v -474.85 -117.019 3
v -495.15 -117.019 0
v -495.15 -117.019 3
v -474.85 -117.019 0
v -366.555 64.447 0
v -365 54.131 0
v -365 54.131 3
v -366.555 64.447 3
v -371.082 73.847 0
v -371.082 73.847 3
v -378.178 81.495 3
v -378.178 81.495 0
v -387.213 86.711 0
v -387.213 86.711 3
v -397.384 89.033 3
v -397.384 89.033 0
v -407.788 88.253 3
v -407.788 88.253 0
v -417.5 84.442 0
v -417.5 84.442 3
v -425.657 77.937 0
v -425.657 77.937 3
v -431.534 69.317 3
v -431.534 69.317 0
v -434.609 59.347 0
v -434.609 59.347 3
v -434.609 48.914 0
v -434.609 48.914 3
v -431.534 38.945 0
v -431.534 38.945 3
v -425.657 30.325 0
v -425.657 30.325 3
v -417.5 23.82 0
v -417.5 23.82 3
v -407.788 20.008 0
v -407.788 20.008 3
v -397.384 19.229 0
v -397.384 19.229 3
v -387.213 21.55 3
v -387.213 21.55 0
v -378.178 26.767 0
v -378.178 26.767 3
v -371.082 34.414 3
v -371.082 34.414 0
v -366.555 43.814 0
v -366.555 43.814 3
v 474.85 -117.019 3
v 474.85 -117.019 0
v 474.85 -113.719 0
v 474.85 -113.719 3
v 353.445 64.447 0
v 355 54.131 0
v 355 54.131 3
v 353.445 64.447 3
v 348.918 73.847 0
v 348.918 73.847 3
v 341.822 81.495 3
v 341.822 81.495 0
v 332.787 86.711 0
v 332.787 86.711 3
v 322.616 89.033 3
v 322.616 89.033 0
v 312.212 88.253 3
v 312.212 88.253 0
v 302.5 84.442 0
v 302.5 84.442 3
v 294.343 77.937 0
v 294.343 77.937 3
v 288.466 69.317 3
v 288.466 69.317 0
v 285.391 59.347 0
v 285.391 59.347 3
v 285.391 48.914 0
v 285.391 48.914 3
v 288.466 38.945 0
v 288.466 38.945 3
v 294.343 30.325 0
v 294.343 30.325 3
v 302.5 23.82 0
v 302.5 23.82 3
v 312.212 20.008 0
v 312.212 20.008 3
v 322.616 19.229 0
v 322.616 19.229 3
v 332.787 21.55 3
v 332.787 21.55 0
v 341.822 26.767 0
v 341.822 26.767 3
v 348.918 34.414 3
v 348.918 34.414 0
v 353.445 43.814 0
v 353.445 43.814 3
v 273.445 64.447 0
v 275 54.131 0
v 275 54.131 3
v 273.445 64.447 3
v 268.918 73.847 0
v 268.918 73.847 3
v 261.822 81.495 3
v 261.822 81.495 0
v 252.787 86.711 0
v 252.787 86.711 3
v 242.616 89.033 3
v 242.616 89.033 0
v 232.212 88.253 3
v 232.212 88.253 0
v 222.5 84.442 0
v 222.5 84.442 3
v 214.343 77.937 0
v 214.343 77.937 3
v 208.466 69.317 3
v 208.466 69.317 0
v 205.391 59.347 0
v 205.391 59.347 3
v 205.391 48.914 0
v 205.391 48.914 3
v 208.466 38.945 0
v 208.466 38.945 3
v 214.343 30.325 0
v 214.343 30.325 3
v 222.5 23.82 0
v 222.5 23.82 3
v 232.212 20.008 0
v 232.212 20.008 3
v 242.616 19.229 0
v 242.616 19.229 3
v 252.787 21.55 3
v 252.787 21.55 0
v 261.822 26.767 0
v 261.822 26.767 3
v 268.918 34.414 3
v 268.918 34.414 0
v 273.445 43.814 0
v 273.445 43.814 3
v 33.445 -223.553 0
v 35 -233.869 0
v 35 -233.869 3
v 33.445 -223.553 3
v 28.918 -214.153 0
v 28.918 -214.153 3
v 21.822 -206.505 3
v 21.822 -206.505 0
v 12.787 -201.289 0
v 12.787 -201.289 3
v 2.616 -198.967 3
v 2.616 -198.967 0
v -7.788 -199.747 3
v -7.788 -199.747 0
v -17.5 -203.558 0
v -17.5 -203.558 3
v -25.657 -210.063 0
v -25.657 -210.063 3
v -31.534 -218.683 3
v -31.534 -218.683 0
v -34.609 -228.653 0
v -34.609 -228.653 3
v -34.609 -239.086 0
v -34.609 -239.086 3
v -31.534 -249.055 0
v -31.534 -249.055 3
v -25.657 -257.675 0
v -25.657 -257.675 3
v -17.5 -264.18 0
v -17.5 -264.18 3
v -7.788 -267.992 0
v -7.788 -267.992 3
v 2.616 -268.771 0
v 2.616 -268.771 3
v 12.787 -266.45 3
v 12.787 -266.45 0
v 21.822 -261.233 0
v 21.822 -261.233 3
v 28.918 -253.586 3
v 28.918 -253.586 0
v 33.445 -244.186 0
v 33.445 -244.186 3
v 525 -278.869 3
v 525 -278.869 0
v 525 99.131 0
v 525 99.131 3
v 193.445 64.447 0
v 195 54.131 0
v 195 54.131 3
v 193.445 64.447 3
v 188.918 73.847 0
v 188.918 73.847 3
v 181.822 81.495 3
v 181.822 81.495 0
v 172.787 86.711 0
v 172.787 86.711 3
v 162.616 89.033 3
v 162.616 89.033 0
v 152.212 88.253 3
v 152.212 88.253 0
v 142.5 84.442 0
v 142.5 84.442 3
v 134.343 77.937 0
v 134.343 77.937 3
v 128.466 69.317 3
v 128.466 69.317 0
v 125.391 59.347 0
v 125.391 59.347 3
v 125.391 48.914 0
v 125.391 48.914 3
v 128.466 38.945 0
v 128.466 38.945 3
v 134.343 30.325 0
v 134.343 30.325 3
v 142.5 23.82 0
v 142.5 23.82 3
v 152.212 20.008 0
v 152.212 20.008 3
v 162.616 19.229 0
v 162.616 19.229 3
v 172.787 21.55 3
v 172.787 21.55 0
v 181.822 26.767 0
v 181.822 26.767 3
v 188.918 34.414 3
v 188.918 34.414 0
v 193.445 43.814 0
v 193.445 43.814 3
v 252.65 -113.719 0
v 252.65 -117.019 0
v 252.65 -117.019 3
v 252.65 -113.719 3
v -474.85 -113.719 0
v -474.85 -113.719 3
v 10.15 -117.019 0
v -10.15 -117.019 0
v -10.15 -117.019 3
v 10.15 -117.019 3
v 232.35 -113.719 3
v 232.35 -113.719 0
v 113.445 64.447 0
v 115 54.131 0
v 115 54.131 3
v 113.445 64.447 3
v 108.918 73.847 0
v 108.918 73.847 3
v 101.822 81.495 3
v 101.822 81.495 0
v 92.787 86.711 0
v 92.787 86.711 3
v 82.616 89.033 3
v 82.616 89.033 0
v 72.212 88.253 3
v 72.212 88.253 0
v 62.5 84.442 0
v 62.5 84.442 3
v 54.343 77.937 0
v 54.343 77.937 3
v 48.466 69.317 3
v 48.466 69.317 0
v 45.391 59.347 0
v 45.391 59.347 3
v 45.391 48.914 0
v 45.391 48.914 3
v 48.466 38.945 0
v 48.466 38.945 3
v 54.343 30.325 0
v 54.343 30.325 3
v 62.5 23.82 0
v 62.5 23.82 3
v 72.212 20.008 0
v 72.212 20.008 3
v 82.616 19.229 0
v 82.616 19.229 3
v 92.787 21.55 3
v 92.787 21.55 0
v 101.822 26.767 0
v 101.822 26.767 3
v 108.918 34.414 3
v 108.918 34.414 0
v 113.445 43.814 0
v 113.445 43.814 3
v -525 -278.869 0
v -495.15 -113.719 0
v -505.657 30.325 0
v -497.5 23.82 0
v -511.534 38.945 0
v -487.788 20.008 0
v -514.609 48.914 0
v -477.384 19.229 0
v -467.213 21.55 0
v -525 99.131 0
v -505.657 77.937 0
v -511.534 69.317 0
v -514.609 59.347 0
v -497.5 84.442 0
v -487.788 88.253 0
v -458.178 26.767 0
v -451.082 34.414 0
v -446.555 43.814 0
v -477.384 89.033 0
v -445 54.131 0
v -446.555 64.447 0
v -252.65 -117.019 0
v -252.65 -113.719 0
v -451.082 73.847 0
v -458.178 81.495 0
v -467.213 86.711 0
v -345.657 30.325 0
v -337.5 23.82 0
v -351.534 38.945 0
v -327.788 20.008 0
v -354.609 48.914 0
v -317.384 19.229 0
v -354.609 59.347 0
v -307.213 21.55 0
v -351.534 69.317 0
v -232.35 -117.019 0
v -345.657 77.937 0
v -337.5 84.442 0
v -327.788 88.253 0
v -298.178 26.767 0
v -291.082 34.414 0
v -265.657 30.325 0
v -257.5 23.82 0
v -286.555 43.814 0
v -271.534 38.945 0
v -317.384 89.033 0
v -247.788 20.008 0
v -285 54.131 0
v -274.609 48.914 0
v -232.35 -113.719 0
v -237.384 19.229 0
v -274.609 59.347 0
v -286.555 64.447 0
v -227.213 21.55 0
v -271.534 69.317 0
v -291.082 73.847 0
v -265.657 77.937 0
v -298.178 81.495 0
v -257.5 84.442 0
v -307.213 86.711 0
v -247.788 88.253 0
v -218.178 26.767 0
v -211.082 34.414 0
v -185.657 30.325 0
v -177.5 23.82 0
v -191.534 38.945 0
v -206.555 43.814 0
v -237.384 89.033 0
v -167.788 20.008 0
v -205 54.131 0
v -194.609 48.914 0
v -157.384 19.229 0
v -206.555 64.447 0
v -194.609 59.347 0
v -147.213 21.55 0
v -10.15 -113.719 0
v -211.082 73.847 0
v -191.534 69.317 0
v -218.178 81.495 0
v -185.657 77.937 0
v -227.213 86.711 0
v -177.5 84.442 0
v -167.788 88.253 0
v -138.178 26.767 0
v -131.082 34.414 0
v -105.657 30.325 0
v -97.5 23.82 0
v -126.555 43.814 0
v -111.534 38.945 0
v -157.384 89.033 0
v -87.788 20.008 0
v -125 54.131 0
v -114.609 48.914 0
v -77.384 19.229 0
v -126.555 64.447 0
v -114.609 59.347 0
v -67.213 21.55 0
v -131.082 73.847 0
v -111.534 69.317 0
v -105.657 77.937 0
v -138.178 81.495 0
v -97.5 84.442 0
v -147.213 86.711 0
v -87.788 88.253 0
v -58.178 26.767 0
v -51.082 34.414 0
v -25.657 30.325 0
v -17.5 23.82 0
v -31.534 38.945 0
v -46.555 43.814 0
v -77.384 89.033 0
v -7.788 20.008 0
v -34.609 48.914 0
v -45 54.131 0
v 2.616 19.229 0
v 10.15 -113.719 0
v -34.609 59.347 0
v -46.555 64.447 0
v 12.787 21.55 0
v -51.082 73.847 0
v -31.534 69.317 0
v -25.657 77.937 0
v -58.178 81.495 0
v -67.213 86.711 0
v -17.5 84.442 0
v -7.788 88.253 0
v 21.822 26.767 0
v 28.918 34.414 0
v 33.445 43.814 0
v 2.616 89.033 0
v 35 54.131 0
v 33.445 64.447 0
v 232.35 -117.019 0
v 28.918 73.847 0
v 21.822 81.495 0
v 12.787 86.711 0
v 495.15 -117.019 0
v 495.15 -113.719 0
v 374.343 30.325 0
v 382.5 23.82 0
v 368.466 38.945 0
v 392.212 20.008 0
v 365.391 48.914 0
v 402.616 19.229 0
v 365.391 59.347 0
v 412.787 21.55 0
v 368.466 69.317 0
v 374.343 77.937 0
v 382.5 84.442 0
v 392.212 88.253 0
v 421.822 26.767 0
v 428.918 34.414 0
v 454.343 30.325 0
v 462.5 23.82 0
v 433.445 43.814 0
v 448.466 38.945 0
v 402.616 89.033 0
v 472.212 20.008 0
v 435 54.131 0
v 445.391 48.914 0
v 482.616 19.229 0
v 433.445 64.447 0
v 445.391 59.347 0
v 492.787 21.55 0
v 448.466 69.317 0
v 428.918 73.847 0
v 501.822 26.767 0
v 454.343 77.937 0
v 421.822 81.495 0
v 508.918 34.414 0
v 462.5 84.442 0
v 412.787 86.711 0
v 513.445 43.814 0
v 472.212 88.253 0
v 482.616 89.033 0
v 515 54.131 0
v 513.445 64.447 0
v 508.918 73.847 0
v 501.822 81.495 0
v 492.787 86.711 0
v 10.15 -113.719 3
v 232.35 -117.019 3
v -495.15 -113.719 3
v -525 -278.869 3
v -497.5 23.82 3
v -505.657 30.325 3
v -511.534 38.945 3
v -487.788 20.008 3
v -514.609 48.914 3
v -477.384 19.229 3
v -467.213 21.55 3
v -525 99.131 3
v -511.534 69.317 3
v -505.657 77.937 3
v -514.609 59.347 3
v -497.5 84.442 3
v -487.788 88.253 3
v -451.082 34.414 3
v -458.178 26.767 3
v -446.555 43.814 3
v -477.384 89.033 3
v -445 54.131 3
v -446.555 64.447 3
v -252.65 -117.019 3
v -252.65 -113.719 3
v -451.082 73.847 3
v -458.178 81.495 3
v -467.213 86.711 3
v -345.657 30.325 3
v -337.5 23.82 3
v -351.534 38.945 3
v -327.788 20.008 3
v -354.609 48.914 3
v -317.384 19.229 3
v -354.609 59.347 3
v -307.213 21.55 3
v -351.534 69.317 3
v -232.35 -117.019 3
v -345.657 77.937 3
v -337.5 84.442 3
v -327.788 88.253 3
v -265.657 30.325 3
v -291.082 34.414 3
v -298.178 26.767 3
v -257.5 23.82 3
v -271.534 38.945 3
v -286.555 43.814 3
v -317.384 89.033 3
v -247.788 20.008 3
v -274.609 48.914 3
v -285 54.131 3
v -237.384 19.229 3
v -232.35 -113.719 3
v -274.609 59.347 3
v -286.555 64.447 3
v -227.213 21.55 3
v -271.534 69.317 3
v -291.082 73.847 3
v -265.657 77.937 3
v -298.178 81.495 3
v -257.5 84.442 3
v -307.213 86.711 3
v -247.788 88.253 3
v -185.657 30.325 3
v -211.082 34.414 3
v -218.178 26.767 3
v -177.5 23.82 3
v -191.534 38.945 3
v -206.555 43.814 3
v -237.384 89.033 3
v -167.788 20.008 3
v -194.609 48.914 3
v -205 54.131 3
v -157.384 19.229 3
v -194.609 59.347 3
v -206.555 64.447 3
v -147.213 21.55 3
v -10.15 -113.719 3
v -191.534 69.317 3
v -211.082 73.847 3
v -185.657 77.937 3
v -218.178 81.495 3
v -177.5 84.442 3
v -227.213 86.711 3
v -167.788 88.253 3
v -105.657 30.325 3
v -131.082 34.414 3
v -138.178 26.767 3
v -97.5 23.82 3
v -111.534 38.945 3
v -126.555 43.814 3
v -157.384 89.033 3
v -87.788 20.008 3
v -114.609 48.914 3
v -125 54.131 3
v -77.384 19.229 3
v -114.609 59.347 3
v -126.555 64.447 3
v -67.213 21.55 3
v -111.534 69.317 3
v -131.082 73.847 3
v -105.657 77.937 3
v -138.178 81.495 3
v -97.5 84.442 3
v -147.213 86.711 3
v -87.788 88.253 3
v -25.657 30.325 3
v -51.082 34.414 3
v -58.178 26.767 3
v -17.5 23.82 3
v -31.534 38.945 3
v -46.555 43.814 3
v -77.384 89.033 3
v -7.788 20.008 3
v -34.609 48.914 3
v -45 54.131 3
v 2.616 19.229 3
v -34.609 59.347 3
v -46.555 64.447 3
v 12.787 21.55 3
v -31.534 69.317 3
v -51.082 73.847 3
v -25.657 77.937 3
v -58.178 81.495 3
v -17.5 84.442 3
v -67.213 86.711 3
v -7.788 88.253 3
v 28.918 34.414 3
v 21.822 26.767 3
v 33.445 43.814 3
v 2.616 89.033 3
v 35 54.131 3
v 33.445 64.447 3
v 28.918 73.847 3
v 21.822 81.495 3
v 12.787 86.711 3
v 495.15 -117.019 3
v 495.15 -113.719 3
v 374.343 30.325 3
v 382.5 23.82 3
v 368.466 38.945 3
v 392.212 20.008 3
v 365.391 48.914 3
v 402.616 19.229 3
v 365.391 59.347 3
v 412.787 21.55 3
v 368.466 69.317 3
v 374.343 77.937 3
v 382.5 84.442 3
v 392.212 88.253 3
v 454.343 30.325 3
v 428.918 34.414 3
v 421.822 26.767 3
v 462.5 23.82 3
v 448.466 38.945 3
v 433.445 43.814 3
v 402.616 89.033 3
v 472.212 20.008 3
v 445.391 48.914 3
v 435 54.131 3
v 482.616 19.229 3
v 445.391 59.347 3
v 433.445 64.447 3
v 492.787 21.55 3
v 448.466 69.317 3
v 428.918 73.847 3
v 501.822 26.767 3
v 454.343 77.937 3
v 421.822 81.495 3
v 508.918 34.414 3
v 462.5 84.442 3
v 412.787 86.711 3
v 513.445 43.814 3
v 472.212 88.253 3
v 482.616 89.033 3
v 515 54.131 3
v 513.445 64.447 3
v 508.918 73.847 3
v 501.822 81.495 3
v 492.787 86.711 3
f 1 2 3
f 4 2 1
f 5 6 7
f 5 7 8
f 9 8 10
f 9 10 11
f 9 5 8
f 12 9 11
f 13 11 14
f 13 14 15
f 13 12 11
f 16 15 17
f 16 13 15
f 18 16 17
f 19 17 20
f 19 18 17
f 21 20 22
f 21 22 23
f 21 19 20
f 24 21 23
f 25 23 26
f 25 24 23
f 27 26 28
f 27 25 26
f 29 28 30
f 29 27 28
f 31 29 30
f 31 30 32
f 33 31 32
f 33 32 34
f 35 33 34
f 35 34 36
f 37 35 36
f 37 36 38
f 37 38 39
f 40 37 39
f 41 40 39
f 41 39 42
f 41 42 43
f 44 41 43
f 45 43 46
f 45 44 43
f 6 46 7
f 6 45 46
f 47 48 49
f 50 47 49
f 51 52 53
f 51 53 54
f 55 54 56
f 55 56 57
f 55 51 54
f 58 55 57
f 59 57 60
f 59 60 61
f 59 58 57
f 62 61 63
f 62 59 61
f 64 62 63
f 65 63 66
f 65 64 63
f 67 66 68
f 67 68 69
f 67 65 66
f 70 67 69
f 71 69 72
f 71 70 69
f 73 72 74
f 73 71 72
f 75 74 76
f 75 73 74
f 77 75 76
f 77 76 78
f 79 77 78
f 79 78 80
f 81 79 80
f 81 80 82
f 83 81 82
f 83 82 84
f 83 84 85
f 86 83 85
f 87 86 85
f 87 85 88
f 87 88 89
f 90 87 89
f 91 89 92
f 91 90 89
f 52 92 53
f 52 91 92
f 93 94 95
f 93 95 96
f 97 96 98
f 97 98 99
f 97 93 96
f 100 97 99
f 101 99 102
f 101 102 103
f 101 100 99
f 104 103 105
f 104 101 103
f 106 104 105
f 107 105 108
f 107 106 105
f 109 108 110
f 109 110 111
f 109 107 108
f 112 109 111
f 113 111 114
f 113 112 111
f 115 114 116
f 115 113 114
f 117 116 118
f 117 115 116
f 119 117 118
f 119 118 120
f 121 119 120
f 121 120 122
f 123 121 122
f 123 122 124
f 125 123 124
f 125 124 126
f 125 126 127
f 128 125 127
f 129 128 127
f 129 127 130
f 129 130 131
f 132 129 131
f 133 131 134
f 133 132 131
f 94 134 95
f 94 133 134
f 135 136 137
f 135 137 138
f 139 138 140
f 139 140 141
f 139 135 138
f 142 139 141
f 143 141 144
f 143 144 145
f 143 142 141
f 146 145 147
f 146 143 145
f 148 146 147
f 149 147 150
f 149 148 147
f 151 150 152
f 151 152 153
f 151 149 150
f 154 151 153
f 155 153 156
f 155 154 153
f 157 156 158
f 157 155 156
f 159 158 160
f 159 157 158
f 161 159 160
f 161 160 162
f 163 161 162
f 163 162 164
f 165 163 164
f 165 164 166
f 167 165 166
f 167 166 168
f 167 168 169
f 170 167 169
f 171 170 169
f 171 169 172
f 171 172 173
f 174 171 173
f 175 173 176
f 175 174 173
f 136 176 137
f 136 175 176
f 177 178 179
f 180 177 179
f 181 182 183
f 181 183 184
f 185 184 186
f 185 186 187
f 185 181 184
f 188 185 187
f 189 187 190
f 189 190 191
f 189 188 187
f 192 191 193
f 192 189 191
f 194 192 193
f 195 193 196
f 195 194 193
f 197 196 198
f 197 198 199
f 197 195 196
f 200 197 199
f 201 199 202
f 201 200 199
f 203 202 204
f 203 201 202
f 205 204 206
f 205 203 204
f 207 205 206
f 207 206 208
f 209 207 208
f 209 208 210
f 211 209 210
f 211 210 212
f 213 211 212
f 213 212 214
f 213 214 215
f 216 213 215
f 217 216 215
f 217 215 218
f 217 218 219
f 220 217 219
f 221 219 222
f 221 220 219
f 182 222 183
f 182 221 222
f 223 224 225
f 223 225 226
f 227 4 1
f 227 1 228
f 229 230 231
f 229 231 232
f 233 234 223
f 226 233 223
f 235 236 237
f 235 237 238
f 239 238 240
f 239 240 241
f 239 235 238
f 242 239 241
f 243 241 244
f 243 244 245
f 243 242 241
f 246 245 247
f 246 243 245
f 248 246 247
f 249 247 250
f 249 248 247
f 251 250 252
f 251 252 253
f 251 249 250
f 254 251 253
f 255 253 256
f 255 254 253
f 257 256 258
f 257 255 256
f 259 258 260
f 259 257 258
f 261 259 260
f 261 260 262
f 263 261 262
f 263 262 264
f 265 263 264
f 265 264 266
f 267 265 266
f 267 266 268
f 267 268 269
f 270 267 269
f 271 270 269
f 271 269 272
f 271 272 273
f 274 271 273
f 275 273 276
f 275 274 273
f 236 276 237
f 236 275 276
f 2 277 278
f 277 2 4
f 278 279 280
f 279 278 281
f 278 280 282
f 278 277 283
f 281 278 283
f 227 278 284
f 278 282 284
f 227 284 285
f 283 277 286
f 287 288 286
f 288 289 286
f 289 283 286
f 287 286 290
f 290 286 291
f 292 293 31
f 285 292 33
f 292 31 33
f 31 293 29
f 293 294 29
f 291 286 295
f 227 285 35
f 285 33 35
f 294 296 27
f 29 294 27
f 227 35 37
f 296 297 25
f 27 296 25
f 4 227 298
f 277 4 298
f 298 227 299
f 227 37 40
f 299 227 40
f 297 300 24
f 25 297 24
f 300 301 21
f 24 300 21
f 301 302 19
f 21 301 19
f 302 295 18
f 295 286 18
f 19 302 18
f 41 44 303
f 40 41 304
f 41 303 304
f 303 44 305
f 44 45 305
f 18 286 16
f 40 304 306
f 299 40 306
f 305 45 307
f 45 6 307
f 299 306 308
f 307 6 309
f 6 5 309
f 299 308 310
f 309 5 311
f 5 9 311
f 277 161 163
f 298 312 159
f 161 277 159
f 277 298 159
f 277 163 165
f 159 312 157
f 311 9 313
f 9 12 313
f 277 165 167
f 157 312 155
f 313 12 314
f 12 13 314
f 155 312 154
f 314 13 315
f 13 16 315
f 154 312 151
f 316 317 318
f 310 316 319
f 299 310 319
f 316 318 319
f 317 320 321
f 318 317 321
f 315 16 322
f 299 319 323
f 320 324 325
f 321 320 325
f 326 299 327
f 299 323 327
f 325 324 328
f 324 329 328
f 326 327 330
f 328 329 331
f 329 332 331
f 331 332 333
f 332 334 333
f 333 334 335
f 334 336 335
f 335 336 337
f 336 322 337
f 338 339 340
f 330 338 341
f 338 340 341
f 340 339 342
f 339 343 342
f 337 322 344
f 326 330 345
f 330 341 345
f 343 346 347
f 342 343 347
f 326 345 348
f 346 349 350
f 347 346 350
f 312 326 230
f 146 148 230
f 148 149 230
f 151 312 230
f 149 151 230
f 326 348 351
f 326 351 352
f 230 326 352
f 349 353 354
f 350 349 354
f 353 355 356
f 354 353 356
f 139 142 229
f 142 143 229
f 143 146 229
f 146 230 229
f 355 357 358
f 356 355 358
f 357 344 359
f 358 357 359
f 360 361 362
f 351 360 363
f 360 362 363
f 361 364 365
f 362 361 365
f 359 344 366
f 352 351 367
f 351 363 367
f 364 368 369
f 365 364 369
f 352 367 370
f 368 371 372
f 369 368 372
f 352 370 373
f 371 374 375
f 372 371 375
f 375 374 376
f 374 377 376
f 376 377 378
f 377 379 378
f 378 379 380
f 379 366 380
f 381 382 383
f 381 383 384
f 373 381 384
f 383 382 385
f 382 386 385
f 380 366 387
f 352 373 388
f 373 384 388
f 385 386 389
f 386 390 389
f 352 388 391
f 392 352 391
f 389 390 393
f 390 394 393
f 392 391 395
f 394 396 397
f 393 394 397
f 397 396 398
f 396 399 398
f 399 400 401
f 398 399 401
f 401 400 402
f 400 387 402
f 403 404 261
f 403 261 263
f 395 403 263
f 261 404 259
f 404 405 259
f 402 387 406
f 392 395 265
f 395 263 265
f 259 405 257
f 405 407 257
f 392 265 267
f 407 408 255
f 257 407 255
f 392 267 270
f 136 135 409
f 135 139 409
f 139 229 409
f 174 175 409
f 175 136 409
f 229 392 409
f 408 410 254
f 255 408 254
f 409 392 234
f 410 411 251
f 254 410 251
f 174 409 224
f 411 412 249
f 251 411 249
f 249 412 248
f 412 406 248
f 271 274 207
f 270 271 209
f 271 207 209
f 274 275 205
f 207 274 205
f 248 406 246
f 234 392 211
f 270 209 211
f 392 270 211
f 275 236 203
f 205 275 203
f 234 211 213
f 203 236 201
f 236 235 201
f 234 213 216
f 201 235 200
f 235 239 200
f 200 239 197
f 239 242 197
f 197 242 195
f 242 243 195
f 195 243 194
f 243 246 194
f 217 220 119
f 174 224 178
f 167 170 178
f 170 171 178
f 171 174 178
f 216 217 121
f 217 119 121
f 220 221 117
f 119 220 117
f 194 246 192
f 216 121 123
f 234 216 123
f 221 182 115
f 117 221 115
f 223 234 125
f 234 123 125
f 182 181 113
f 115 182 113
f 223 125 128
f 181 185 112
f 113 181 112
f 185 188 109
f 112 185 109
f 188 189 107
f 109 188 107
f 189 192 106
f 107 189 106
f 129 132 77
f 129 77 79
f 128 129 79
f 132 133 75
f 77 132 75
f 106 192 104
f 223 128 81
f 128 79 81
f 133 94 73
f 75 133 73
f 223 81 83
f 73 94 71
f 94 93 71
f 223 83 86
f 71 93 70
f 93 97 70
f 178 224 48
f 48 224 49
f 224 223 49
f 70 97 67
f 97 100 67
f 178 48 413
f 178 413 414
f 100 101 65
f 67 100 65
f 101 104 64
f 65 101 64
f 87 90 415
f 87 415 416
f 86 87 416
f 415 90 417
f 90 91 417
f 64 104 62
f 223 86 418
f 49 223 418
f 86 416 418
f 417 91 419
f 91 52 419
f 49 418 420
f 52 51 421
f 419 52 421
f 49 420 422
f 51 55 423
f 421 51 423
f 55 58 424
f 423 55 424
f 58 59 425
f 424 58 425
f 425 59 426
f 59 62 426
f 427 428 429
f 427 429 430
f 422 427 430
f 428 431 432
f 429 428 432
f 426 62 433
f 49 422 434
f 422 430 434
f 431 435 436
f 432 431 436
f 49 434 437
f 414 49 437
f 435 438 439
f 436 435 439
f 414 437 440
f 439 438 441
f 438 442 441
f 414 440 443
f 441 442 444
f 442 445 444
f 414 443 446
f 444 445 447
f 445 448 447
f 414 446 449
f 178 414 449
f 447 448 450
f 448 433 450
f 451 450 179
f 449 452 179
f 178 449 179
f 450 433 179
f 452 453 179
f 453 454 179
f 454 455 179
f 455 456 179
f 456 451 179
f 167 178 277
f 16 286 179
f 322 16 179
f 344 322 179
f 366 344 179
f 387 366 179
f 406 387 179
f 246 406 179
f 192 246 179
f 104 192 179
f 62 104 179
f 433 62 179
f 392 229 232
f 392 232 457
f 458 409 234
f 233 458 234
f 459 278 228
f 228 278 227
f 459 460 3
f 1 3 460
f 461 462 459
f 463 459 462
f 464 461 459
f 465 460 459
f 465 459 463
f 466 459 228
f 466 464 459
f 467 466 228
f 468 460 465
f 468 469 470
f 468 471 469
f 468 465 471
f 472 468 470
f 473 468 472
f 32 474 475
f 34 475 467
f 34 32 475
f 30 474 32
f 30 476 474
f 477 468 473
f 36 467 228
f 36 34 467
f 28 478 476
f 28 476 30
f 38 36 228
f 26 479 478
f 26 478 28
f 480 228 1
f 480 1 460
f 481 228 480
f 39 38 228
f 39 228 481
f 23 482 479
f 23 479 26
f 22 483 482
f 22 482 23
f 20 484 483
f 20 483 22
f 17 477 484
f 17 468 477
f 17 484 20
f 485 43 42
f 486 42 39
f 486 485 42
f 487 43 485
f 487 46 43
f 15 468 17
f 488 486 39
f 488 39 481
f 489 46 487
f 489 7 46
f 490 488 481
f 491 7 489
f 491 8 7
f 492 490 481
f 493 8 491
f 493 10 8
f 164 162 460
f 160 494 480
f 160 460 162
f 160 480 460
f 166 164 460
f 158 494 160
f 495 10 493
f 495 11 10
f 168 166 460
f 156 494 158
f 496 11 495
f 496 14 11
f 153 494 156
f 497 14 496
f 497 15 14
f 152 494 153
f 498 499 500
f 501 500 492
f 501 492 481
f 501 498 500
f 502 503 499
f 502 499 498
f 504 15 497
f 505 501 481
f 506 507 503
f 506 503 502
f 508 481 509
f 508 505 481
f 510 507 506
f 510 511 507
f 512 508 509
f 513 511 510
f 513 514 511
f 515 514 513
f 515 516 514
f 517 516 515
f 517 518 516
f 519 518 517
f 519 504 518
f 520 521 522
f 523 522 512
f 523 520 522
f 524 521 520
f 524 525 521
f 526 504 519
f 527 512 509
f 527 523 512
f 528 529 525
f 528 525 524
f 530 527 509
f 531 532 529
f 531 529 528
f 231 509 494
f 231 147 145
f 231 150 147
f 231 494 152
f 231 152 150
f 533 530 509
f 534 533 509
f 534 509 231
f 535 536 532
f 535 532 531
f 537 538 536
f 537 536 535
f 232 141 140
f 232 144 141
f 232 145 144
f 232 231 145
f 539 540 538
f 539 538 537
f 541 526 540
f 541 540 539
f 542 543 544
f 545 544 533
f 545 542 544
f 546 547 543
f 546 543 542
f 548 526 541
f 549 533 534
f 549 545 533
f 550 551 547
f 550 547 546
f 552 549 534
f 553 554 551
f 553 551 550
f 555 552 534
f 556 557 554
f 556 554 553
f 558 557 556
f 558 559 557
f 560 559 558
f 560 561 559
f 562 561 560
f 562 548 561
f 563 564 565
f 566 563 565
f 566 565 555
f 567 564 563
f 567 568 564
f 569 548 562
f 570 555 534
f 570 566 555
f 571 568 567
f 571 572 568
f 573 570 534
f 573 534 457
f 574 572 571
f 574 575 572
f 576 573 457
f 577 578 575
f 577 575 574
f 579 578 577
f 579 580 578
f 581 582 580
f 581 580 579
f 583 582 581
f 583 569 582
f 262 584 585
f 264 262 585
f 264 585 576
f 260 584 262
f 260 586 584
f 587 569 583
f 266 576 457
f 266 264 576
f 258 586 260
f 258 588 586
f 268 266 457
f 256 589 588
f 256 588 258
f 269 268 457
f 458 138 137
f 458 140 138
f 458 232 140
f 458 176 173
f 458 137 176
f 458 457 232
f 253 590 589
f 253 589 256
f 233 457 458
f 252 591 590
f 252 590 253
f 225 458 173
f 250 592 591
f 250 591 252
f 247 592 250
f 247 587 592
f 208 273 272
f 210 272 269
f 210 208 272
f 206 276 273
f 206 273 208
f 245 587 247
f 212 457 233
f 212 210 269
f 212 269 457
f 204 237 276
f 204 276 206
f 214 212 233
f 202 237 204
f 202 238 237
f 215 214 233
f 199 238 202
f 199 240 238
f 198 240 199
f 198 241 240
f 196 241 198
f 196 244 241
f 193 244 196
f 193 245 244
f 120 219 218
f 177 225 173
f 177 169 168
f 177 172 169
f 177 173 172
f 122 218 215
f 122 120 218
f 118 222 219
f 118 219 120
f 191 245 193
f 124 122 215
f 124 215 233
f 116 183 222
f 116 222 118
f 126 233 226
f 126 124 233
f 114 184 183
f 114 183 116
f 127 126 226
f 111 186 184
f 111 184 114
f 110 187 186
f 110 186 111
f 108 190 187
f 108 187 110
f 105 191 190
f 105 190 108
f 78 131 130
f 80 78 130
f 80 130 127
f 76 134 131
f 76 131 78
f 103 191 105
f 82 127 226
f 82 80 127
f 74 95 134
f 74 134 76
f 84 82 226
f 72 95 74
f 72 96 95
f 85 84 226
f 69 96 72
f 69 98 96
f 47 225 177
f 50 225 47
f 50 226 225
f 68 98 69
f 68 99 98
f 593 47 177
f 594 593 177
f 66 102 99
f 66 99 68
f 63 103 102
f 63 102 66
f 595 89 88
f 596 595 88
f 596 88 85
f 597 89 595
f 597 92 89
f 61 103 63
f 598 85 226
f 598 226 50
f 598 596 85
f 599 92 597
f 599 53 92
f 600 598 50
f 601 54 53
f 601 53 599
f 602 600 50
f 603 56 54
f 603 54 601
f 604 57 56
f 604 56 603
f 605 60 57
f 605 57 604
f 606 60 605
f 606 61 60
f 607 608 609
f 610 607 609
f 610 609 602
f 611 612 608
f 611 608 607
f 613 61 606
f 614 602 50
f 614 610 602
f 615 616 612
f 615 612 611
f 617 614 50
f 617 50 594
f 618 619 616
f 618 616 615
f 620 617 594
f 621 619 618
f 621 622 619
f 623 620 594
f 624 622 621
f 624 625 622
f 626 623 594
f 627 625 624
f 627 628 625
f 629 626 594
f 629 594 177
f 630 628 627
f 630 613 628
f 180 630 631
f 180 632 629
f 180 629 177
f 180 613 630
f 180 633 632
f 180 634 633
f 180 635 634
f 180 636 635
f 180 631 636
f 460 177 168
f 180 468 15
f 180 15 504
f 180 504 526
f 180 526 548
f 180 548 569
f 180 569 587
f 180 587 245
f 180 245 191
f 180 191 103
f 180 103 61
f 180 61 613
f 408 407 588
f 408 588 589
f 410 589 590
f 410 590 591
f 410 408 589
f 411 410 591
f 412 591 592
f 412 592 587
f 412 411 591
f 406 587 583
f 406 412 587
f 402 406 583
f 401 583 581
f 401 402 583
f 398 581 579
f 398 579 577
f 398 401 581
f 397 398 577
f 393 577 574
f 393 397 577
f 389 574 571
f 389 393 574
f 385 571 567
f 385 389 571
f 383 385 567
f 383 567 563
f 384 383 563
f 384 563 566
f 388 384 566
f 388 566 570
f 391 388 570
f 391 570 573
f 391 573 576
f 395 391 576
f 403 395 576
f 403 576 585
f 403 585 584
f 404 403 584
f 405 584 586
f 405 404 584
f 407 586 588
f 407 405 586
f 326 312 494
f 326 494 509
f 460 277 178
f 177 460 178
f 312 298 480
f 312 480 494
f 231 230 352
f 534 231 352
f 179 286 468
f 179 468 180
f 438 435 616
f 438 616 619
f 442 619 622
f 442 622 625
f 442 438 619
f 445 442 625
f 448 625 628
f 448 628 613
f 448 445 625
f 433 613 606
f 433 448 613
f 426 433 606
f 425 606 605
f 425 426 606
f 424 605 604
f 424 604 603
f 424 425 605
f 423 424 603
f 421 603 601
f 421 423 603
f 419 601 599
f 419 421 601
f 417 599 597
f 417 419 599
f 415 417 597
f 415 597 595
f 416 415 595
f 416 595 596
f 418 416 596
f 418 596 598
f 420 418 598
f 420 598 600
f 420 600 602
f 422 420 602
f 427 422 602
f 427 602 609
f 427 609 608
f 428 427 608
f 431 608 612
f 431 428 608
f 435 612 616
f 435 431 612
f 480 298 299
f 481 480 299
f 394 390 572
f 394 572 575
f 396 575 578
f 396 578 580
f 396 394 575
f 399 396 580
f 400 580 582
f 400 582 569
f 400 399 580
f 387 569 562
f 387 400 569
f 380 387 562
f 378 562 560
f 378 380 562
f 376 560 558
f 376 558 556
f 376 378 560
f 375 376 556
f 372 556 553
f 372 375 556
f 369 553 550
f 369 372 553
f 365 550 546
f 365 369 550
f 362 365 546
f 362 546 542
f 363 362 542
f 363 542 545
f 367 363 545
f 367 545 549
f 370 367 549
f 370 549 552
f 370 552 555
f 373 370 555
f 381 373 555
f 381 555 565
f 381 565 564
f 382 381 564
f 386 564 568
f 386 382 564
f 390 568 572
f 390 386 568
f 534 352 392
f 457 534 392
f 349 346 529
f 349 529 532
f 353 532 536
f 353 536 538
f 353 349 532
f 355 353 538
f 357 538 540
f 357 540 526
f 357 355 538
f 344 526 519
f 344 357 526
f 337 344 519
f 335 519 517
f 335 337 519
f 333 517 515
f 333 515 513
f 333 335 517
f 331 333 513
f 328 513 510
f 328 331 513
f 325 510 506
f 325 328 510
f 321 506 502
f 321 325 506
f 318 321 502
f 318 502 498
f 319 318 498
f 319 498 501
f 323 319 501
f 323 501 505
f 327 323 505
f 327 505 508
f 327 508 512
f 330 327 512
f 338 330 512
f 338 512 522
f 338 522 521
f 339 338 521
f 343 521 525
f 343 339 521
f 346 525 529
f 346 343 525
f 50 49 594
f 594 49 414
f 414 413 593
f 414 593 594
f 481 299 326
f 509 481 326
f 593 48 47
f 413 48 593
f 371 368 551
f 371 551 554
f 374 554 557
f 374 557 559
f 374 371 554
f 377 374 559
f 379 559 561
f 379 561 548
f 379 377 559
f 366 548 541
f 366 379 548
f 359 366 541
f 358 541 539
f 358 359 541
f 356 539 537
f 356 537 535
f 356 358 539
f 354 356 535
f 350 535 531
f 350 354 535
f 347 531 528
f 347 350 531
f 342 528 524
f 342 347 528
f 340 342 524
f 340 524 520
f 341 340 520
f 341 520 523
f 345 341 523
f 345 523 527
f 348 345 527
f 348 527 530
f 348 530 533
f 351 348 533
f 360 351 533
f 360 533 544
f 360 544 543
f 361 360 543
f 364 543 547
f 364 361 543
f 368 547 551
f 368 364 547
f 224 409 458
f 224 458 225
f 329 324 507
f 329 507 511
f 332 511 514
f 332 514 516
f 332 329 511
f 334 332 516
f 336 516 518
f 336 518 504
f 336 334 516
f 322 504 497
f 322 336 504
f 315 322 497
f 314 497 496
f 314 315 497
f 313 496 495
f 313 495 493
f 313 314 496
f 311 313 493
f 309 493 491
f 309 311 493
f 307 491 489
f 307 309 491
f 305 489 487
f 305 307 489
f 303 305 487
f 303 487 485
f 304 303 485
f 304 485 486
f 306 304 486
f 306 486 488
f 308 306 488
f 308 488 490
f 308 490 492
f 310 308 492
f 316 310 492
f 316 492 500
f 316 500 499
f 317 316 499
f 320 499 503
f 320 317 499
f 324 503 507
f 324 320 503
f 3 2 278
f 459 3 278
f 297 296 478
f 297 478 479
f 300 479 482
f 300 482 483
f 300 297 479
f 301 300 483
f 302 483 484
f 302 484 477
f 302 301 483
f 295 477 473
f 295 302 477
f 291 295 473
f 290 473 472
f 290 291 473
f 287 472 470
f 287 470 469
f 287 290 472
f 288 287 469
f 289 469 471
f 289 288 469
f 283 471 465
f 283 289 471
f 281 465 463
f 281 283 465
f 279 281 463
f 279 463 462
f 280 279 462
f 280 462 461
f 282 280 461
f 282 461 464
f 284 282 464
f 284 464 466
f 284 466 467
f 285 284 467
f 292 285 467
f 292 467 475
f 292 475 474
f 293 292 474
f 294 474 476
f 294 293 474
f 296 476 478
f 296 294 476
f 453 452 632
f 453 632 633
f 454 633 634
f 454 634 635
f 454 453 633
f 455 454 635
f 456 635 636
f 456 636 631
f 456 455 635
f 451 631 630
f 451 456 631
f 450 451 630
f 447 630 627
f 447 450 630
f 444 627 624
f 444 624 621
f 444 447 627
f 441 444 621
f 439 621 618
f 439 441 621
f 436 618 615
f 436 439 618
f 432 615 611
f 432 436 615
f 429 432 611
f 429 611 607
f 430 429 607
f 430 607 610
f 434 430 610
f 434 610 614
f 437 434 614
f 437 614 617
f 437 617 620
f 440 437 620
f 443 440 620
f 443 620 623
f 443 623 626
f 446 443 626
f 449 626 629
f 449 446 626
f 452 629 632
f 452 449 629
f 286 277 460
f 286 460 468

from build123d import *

# Parameters (mm, degrees)
F0_W     = 1050
F0_H     = 378
F0_W_2   = 20.3
F0_H_2   = 3.3
F0_R     = 35
F1_DEPTH = 3


with BuildPart() as f1:
    # F0 (on Top) → F1 (new body)
    with BuildSketch(Plane.XY):
        with Locations((0, -89.869341)):
            Rectangle(F0_W, F0_H)
        with Locations((-485, -115.369341)):
            Rectangle(F0_W_2, F0_H_2, mode=Mode.SUBTRACT)
        with Locations((-242.5, -115.369341)):
            Rectangle(F0_W_2, F0_H_2, mode=Mode.SUBTRACT)
        with Locations((0, -233.869341)):
            Circle(F0_R, mode=Mode.SUBTRACT)
        with Locations((0, -115.369341)):
            Rectangle(F0_W_2, F0_H_2, mode=Mode.SUBTRACT)
        with Locations((242.5, -115.369341)):
            Rectangle(F0_W_2, F0_H_2, mode=Mode.SUBTRACT)
        with Locations((485, -115.369341)):
            Rectangle(F0_W_2, F0_H_2, mode=Mode.SUBTRACT)
        with Locations((-480, 54.130659)):
            Circle(F0_R, mode=Mode.SUBTRACT)
        with Locations((-400, 54.130659)):
            Circle(F0_R, mode=Mode.SUBTRACT)
        with Locations((-320, 54.130659)):
            Circle(F0_R, mode=Mode.SUBTRACT)
        with Locations((-240, 54.130659)):
            Circle(F0_R, mode=Mode.SUBTRACT)
        with Locations((-160, 54.130659)):
            Circle(F0_R, mode=Mode.SUBTRACT)
        with Locations((-80, 54.130659)):
            Circle(F0_R, mode=Mode.SUBTRACT)
        with Locations((0, 54.130659)):
            Circle(F0_R, mode=Mode.SUBTRACT)
        with Locations((80, 54.130659)):
            Circle(F0_R, mode=Mode.SUBTRACT)
        with Locations((160, 54.130659)):
            Circle(F0_R, mode=Mode.SUBTRACT)
        with Locations((240, 54.130659)):
            Circle(F0_R, mode=Mode.SUBTRACT)
        with Locations((320, 54.130659)):
            Circle(F0_R, mode=Mode.SUBTRACT)
        with Locations((400, 54.130659)):
            Circle(F0_R, mode=Mode.SUBTRACT)
        with Locations((480, 54.130659)):
            Circle(F0_R, mode=Mode.SUBTRACT)
    extrude(amount=F1_DEPTH)


solid = f1.part
